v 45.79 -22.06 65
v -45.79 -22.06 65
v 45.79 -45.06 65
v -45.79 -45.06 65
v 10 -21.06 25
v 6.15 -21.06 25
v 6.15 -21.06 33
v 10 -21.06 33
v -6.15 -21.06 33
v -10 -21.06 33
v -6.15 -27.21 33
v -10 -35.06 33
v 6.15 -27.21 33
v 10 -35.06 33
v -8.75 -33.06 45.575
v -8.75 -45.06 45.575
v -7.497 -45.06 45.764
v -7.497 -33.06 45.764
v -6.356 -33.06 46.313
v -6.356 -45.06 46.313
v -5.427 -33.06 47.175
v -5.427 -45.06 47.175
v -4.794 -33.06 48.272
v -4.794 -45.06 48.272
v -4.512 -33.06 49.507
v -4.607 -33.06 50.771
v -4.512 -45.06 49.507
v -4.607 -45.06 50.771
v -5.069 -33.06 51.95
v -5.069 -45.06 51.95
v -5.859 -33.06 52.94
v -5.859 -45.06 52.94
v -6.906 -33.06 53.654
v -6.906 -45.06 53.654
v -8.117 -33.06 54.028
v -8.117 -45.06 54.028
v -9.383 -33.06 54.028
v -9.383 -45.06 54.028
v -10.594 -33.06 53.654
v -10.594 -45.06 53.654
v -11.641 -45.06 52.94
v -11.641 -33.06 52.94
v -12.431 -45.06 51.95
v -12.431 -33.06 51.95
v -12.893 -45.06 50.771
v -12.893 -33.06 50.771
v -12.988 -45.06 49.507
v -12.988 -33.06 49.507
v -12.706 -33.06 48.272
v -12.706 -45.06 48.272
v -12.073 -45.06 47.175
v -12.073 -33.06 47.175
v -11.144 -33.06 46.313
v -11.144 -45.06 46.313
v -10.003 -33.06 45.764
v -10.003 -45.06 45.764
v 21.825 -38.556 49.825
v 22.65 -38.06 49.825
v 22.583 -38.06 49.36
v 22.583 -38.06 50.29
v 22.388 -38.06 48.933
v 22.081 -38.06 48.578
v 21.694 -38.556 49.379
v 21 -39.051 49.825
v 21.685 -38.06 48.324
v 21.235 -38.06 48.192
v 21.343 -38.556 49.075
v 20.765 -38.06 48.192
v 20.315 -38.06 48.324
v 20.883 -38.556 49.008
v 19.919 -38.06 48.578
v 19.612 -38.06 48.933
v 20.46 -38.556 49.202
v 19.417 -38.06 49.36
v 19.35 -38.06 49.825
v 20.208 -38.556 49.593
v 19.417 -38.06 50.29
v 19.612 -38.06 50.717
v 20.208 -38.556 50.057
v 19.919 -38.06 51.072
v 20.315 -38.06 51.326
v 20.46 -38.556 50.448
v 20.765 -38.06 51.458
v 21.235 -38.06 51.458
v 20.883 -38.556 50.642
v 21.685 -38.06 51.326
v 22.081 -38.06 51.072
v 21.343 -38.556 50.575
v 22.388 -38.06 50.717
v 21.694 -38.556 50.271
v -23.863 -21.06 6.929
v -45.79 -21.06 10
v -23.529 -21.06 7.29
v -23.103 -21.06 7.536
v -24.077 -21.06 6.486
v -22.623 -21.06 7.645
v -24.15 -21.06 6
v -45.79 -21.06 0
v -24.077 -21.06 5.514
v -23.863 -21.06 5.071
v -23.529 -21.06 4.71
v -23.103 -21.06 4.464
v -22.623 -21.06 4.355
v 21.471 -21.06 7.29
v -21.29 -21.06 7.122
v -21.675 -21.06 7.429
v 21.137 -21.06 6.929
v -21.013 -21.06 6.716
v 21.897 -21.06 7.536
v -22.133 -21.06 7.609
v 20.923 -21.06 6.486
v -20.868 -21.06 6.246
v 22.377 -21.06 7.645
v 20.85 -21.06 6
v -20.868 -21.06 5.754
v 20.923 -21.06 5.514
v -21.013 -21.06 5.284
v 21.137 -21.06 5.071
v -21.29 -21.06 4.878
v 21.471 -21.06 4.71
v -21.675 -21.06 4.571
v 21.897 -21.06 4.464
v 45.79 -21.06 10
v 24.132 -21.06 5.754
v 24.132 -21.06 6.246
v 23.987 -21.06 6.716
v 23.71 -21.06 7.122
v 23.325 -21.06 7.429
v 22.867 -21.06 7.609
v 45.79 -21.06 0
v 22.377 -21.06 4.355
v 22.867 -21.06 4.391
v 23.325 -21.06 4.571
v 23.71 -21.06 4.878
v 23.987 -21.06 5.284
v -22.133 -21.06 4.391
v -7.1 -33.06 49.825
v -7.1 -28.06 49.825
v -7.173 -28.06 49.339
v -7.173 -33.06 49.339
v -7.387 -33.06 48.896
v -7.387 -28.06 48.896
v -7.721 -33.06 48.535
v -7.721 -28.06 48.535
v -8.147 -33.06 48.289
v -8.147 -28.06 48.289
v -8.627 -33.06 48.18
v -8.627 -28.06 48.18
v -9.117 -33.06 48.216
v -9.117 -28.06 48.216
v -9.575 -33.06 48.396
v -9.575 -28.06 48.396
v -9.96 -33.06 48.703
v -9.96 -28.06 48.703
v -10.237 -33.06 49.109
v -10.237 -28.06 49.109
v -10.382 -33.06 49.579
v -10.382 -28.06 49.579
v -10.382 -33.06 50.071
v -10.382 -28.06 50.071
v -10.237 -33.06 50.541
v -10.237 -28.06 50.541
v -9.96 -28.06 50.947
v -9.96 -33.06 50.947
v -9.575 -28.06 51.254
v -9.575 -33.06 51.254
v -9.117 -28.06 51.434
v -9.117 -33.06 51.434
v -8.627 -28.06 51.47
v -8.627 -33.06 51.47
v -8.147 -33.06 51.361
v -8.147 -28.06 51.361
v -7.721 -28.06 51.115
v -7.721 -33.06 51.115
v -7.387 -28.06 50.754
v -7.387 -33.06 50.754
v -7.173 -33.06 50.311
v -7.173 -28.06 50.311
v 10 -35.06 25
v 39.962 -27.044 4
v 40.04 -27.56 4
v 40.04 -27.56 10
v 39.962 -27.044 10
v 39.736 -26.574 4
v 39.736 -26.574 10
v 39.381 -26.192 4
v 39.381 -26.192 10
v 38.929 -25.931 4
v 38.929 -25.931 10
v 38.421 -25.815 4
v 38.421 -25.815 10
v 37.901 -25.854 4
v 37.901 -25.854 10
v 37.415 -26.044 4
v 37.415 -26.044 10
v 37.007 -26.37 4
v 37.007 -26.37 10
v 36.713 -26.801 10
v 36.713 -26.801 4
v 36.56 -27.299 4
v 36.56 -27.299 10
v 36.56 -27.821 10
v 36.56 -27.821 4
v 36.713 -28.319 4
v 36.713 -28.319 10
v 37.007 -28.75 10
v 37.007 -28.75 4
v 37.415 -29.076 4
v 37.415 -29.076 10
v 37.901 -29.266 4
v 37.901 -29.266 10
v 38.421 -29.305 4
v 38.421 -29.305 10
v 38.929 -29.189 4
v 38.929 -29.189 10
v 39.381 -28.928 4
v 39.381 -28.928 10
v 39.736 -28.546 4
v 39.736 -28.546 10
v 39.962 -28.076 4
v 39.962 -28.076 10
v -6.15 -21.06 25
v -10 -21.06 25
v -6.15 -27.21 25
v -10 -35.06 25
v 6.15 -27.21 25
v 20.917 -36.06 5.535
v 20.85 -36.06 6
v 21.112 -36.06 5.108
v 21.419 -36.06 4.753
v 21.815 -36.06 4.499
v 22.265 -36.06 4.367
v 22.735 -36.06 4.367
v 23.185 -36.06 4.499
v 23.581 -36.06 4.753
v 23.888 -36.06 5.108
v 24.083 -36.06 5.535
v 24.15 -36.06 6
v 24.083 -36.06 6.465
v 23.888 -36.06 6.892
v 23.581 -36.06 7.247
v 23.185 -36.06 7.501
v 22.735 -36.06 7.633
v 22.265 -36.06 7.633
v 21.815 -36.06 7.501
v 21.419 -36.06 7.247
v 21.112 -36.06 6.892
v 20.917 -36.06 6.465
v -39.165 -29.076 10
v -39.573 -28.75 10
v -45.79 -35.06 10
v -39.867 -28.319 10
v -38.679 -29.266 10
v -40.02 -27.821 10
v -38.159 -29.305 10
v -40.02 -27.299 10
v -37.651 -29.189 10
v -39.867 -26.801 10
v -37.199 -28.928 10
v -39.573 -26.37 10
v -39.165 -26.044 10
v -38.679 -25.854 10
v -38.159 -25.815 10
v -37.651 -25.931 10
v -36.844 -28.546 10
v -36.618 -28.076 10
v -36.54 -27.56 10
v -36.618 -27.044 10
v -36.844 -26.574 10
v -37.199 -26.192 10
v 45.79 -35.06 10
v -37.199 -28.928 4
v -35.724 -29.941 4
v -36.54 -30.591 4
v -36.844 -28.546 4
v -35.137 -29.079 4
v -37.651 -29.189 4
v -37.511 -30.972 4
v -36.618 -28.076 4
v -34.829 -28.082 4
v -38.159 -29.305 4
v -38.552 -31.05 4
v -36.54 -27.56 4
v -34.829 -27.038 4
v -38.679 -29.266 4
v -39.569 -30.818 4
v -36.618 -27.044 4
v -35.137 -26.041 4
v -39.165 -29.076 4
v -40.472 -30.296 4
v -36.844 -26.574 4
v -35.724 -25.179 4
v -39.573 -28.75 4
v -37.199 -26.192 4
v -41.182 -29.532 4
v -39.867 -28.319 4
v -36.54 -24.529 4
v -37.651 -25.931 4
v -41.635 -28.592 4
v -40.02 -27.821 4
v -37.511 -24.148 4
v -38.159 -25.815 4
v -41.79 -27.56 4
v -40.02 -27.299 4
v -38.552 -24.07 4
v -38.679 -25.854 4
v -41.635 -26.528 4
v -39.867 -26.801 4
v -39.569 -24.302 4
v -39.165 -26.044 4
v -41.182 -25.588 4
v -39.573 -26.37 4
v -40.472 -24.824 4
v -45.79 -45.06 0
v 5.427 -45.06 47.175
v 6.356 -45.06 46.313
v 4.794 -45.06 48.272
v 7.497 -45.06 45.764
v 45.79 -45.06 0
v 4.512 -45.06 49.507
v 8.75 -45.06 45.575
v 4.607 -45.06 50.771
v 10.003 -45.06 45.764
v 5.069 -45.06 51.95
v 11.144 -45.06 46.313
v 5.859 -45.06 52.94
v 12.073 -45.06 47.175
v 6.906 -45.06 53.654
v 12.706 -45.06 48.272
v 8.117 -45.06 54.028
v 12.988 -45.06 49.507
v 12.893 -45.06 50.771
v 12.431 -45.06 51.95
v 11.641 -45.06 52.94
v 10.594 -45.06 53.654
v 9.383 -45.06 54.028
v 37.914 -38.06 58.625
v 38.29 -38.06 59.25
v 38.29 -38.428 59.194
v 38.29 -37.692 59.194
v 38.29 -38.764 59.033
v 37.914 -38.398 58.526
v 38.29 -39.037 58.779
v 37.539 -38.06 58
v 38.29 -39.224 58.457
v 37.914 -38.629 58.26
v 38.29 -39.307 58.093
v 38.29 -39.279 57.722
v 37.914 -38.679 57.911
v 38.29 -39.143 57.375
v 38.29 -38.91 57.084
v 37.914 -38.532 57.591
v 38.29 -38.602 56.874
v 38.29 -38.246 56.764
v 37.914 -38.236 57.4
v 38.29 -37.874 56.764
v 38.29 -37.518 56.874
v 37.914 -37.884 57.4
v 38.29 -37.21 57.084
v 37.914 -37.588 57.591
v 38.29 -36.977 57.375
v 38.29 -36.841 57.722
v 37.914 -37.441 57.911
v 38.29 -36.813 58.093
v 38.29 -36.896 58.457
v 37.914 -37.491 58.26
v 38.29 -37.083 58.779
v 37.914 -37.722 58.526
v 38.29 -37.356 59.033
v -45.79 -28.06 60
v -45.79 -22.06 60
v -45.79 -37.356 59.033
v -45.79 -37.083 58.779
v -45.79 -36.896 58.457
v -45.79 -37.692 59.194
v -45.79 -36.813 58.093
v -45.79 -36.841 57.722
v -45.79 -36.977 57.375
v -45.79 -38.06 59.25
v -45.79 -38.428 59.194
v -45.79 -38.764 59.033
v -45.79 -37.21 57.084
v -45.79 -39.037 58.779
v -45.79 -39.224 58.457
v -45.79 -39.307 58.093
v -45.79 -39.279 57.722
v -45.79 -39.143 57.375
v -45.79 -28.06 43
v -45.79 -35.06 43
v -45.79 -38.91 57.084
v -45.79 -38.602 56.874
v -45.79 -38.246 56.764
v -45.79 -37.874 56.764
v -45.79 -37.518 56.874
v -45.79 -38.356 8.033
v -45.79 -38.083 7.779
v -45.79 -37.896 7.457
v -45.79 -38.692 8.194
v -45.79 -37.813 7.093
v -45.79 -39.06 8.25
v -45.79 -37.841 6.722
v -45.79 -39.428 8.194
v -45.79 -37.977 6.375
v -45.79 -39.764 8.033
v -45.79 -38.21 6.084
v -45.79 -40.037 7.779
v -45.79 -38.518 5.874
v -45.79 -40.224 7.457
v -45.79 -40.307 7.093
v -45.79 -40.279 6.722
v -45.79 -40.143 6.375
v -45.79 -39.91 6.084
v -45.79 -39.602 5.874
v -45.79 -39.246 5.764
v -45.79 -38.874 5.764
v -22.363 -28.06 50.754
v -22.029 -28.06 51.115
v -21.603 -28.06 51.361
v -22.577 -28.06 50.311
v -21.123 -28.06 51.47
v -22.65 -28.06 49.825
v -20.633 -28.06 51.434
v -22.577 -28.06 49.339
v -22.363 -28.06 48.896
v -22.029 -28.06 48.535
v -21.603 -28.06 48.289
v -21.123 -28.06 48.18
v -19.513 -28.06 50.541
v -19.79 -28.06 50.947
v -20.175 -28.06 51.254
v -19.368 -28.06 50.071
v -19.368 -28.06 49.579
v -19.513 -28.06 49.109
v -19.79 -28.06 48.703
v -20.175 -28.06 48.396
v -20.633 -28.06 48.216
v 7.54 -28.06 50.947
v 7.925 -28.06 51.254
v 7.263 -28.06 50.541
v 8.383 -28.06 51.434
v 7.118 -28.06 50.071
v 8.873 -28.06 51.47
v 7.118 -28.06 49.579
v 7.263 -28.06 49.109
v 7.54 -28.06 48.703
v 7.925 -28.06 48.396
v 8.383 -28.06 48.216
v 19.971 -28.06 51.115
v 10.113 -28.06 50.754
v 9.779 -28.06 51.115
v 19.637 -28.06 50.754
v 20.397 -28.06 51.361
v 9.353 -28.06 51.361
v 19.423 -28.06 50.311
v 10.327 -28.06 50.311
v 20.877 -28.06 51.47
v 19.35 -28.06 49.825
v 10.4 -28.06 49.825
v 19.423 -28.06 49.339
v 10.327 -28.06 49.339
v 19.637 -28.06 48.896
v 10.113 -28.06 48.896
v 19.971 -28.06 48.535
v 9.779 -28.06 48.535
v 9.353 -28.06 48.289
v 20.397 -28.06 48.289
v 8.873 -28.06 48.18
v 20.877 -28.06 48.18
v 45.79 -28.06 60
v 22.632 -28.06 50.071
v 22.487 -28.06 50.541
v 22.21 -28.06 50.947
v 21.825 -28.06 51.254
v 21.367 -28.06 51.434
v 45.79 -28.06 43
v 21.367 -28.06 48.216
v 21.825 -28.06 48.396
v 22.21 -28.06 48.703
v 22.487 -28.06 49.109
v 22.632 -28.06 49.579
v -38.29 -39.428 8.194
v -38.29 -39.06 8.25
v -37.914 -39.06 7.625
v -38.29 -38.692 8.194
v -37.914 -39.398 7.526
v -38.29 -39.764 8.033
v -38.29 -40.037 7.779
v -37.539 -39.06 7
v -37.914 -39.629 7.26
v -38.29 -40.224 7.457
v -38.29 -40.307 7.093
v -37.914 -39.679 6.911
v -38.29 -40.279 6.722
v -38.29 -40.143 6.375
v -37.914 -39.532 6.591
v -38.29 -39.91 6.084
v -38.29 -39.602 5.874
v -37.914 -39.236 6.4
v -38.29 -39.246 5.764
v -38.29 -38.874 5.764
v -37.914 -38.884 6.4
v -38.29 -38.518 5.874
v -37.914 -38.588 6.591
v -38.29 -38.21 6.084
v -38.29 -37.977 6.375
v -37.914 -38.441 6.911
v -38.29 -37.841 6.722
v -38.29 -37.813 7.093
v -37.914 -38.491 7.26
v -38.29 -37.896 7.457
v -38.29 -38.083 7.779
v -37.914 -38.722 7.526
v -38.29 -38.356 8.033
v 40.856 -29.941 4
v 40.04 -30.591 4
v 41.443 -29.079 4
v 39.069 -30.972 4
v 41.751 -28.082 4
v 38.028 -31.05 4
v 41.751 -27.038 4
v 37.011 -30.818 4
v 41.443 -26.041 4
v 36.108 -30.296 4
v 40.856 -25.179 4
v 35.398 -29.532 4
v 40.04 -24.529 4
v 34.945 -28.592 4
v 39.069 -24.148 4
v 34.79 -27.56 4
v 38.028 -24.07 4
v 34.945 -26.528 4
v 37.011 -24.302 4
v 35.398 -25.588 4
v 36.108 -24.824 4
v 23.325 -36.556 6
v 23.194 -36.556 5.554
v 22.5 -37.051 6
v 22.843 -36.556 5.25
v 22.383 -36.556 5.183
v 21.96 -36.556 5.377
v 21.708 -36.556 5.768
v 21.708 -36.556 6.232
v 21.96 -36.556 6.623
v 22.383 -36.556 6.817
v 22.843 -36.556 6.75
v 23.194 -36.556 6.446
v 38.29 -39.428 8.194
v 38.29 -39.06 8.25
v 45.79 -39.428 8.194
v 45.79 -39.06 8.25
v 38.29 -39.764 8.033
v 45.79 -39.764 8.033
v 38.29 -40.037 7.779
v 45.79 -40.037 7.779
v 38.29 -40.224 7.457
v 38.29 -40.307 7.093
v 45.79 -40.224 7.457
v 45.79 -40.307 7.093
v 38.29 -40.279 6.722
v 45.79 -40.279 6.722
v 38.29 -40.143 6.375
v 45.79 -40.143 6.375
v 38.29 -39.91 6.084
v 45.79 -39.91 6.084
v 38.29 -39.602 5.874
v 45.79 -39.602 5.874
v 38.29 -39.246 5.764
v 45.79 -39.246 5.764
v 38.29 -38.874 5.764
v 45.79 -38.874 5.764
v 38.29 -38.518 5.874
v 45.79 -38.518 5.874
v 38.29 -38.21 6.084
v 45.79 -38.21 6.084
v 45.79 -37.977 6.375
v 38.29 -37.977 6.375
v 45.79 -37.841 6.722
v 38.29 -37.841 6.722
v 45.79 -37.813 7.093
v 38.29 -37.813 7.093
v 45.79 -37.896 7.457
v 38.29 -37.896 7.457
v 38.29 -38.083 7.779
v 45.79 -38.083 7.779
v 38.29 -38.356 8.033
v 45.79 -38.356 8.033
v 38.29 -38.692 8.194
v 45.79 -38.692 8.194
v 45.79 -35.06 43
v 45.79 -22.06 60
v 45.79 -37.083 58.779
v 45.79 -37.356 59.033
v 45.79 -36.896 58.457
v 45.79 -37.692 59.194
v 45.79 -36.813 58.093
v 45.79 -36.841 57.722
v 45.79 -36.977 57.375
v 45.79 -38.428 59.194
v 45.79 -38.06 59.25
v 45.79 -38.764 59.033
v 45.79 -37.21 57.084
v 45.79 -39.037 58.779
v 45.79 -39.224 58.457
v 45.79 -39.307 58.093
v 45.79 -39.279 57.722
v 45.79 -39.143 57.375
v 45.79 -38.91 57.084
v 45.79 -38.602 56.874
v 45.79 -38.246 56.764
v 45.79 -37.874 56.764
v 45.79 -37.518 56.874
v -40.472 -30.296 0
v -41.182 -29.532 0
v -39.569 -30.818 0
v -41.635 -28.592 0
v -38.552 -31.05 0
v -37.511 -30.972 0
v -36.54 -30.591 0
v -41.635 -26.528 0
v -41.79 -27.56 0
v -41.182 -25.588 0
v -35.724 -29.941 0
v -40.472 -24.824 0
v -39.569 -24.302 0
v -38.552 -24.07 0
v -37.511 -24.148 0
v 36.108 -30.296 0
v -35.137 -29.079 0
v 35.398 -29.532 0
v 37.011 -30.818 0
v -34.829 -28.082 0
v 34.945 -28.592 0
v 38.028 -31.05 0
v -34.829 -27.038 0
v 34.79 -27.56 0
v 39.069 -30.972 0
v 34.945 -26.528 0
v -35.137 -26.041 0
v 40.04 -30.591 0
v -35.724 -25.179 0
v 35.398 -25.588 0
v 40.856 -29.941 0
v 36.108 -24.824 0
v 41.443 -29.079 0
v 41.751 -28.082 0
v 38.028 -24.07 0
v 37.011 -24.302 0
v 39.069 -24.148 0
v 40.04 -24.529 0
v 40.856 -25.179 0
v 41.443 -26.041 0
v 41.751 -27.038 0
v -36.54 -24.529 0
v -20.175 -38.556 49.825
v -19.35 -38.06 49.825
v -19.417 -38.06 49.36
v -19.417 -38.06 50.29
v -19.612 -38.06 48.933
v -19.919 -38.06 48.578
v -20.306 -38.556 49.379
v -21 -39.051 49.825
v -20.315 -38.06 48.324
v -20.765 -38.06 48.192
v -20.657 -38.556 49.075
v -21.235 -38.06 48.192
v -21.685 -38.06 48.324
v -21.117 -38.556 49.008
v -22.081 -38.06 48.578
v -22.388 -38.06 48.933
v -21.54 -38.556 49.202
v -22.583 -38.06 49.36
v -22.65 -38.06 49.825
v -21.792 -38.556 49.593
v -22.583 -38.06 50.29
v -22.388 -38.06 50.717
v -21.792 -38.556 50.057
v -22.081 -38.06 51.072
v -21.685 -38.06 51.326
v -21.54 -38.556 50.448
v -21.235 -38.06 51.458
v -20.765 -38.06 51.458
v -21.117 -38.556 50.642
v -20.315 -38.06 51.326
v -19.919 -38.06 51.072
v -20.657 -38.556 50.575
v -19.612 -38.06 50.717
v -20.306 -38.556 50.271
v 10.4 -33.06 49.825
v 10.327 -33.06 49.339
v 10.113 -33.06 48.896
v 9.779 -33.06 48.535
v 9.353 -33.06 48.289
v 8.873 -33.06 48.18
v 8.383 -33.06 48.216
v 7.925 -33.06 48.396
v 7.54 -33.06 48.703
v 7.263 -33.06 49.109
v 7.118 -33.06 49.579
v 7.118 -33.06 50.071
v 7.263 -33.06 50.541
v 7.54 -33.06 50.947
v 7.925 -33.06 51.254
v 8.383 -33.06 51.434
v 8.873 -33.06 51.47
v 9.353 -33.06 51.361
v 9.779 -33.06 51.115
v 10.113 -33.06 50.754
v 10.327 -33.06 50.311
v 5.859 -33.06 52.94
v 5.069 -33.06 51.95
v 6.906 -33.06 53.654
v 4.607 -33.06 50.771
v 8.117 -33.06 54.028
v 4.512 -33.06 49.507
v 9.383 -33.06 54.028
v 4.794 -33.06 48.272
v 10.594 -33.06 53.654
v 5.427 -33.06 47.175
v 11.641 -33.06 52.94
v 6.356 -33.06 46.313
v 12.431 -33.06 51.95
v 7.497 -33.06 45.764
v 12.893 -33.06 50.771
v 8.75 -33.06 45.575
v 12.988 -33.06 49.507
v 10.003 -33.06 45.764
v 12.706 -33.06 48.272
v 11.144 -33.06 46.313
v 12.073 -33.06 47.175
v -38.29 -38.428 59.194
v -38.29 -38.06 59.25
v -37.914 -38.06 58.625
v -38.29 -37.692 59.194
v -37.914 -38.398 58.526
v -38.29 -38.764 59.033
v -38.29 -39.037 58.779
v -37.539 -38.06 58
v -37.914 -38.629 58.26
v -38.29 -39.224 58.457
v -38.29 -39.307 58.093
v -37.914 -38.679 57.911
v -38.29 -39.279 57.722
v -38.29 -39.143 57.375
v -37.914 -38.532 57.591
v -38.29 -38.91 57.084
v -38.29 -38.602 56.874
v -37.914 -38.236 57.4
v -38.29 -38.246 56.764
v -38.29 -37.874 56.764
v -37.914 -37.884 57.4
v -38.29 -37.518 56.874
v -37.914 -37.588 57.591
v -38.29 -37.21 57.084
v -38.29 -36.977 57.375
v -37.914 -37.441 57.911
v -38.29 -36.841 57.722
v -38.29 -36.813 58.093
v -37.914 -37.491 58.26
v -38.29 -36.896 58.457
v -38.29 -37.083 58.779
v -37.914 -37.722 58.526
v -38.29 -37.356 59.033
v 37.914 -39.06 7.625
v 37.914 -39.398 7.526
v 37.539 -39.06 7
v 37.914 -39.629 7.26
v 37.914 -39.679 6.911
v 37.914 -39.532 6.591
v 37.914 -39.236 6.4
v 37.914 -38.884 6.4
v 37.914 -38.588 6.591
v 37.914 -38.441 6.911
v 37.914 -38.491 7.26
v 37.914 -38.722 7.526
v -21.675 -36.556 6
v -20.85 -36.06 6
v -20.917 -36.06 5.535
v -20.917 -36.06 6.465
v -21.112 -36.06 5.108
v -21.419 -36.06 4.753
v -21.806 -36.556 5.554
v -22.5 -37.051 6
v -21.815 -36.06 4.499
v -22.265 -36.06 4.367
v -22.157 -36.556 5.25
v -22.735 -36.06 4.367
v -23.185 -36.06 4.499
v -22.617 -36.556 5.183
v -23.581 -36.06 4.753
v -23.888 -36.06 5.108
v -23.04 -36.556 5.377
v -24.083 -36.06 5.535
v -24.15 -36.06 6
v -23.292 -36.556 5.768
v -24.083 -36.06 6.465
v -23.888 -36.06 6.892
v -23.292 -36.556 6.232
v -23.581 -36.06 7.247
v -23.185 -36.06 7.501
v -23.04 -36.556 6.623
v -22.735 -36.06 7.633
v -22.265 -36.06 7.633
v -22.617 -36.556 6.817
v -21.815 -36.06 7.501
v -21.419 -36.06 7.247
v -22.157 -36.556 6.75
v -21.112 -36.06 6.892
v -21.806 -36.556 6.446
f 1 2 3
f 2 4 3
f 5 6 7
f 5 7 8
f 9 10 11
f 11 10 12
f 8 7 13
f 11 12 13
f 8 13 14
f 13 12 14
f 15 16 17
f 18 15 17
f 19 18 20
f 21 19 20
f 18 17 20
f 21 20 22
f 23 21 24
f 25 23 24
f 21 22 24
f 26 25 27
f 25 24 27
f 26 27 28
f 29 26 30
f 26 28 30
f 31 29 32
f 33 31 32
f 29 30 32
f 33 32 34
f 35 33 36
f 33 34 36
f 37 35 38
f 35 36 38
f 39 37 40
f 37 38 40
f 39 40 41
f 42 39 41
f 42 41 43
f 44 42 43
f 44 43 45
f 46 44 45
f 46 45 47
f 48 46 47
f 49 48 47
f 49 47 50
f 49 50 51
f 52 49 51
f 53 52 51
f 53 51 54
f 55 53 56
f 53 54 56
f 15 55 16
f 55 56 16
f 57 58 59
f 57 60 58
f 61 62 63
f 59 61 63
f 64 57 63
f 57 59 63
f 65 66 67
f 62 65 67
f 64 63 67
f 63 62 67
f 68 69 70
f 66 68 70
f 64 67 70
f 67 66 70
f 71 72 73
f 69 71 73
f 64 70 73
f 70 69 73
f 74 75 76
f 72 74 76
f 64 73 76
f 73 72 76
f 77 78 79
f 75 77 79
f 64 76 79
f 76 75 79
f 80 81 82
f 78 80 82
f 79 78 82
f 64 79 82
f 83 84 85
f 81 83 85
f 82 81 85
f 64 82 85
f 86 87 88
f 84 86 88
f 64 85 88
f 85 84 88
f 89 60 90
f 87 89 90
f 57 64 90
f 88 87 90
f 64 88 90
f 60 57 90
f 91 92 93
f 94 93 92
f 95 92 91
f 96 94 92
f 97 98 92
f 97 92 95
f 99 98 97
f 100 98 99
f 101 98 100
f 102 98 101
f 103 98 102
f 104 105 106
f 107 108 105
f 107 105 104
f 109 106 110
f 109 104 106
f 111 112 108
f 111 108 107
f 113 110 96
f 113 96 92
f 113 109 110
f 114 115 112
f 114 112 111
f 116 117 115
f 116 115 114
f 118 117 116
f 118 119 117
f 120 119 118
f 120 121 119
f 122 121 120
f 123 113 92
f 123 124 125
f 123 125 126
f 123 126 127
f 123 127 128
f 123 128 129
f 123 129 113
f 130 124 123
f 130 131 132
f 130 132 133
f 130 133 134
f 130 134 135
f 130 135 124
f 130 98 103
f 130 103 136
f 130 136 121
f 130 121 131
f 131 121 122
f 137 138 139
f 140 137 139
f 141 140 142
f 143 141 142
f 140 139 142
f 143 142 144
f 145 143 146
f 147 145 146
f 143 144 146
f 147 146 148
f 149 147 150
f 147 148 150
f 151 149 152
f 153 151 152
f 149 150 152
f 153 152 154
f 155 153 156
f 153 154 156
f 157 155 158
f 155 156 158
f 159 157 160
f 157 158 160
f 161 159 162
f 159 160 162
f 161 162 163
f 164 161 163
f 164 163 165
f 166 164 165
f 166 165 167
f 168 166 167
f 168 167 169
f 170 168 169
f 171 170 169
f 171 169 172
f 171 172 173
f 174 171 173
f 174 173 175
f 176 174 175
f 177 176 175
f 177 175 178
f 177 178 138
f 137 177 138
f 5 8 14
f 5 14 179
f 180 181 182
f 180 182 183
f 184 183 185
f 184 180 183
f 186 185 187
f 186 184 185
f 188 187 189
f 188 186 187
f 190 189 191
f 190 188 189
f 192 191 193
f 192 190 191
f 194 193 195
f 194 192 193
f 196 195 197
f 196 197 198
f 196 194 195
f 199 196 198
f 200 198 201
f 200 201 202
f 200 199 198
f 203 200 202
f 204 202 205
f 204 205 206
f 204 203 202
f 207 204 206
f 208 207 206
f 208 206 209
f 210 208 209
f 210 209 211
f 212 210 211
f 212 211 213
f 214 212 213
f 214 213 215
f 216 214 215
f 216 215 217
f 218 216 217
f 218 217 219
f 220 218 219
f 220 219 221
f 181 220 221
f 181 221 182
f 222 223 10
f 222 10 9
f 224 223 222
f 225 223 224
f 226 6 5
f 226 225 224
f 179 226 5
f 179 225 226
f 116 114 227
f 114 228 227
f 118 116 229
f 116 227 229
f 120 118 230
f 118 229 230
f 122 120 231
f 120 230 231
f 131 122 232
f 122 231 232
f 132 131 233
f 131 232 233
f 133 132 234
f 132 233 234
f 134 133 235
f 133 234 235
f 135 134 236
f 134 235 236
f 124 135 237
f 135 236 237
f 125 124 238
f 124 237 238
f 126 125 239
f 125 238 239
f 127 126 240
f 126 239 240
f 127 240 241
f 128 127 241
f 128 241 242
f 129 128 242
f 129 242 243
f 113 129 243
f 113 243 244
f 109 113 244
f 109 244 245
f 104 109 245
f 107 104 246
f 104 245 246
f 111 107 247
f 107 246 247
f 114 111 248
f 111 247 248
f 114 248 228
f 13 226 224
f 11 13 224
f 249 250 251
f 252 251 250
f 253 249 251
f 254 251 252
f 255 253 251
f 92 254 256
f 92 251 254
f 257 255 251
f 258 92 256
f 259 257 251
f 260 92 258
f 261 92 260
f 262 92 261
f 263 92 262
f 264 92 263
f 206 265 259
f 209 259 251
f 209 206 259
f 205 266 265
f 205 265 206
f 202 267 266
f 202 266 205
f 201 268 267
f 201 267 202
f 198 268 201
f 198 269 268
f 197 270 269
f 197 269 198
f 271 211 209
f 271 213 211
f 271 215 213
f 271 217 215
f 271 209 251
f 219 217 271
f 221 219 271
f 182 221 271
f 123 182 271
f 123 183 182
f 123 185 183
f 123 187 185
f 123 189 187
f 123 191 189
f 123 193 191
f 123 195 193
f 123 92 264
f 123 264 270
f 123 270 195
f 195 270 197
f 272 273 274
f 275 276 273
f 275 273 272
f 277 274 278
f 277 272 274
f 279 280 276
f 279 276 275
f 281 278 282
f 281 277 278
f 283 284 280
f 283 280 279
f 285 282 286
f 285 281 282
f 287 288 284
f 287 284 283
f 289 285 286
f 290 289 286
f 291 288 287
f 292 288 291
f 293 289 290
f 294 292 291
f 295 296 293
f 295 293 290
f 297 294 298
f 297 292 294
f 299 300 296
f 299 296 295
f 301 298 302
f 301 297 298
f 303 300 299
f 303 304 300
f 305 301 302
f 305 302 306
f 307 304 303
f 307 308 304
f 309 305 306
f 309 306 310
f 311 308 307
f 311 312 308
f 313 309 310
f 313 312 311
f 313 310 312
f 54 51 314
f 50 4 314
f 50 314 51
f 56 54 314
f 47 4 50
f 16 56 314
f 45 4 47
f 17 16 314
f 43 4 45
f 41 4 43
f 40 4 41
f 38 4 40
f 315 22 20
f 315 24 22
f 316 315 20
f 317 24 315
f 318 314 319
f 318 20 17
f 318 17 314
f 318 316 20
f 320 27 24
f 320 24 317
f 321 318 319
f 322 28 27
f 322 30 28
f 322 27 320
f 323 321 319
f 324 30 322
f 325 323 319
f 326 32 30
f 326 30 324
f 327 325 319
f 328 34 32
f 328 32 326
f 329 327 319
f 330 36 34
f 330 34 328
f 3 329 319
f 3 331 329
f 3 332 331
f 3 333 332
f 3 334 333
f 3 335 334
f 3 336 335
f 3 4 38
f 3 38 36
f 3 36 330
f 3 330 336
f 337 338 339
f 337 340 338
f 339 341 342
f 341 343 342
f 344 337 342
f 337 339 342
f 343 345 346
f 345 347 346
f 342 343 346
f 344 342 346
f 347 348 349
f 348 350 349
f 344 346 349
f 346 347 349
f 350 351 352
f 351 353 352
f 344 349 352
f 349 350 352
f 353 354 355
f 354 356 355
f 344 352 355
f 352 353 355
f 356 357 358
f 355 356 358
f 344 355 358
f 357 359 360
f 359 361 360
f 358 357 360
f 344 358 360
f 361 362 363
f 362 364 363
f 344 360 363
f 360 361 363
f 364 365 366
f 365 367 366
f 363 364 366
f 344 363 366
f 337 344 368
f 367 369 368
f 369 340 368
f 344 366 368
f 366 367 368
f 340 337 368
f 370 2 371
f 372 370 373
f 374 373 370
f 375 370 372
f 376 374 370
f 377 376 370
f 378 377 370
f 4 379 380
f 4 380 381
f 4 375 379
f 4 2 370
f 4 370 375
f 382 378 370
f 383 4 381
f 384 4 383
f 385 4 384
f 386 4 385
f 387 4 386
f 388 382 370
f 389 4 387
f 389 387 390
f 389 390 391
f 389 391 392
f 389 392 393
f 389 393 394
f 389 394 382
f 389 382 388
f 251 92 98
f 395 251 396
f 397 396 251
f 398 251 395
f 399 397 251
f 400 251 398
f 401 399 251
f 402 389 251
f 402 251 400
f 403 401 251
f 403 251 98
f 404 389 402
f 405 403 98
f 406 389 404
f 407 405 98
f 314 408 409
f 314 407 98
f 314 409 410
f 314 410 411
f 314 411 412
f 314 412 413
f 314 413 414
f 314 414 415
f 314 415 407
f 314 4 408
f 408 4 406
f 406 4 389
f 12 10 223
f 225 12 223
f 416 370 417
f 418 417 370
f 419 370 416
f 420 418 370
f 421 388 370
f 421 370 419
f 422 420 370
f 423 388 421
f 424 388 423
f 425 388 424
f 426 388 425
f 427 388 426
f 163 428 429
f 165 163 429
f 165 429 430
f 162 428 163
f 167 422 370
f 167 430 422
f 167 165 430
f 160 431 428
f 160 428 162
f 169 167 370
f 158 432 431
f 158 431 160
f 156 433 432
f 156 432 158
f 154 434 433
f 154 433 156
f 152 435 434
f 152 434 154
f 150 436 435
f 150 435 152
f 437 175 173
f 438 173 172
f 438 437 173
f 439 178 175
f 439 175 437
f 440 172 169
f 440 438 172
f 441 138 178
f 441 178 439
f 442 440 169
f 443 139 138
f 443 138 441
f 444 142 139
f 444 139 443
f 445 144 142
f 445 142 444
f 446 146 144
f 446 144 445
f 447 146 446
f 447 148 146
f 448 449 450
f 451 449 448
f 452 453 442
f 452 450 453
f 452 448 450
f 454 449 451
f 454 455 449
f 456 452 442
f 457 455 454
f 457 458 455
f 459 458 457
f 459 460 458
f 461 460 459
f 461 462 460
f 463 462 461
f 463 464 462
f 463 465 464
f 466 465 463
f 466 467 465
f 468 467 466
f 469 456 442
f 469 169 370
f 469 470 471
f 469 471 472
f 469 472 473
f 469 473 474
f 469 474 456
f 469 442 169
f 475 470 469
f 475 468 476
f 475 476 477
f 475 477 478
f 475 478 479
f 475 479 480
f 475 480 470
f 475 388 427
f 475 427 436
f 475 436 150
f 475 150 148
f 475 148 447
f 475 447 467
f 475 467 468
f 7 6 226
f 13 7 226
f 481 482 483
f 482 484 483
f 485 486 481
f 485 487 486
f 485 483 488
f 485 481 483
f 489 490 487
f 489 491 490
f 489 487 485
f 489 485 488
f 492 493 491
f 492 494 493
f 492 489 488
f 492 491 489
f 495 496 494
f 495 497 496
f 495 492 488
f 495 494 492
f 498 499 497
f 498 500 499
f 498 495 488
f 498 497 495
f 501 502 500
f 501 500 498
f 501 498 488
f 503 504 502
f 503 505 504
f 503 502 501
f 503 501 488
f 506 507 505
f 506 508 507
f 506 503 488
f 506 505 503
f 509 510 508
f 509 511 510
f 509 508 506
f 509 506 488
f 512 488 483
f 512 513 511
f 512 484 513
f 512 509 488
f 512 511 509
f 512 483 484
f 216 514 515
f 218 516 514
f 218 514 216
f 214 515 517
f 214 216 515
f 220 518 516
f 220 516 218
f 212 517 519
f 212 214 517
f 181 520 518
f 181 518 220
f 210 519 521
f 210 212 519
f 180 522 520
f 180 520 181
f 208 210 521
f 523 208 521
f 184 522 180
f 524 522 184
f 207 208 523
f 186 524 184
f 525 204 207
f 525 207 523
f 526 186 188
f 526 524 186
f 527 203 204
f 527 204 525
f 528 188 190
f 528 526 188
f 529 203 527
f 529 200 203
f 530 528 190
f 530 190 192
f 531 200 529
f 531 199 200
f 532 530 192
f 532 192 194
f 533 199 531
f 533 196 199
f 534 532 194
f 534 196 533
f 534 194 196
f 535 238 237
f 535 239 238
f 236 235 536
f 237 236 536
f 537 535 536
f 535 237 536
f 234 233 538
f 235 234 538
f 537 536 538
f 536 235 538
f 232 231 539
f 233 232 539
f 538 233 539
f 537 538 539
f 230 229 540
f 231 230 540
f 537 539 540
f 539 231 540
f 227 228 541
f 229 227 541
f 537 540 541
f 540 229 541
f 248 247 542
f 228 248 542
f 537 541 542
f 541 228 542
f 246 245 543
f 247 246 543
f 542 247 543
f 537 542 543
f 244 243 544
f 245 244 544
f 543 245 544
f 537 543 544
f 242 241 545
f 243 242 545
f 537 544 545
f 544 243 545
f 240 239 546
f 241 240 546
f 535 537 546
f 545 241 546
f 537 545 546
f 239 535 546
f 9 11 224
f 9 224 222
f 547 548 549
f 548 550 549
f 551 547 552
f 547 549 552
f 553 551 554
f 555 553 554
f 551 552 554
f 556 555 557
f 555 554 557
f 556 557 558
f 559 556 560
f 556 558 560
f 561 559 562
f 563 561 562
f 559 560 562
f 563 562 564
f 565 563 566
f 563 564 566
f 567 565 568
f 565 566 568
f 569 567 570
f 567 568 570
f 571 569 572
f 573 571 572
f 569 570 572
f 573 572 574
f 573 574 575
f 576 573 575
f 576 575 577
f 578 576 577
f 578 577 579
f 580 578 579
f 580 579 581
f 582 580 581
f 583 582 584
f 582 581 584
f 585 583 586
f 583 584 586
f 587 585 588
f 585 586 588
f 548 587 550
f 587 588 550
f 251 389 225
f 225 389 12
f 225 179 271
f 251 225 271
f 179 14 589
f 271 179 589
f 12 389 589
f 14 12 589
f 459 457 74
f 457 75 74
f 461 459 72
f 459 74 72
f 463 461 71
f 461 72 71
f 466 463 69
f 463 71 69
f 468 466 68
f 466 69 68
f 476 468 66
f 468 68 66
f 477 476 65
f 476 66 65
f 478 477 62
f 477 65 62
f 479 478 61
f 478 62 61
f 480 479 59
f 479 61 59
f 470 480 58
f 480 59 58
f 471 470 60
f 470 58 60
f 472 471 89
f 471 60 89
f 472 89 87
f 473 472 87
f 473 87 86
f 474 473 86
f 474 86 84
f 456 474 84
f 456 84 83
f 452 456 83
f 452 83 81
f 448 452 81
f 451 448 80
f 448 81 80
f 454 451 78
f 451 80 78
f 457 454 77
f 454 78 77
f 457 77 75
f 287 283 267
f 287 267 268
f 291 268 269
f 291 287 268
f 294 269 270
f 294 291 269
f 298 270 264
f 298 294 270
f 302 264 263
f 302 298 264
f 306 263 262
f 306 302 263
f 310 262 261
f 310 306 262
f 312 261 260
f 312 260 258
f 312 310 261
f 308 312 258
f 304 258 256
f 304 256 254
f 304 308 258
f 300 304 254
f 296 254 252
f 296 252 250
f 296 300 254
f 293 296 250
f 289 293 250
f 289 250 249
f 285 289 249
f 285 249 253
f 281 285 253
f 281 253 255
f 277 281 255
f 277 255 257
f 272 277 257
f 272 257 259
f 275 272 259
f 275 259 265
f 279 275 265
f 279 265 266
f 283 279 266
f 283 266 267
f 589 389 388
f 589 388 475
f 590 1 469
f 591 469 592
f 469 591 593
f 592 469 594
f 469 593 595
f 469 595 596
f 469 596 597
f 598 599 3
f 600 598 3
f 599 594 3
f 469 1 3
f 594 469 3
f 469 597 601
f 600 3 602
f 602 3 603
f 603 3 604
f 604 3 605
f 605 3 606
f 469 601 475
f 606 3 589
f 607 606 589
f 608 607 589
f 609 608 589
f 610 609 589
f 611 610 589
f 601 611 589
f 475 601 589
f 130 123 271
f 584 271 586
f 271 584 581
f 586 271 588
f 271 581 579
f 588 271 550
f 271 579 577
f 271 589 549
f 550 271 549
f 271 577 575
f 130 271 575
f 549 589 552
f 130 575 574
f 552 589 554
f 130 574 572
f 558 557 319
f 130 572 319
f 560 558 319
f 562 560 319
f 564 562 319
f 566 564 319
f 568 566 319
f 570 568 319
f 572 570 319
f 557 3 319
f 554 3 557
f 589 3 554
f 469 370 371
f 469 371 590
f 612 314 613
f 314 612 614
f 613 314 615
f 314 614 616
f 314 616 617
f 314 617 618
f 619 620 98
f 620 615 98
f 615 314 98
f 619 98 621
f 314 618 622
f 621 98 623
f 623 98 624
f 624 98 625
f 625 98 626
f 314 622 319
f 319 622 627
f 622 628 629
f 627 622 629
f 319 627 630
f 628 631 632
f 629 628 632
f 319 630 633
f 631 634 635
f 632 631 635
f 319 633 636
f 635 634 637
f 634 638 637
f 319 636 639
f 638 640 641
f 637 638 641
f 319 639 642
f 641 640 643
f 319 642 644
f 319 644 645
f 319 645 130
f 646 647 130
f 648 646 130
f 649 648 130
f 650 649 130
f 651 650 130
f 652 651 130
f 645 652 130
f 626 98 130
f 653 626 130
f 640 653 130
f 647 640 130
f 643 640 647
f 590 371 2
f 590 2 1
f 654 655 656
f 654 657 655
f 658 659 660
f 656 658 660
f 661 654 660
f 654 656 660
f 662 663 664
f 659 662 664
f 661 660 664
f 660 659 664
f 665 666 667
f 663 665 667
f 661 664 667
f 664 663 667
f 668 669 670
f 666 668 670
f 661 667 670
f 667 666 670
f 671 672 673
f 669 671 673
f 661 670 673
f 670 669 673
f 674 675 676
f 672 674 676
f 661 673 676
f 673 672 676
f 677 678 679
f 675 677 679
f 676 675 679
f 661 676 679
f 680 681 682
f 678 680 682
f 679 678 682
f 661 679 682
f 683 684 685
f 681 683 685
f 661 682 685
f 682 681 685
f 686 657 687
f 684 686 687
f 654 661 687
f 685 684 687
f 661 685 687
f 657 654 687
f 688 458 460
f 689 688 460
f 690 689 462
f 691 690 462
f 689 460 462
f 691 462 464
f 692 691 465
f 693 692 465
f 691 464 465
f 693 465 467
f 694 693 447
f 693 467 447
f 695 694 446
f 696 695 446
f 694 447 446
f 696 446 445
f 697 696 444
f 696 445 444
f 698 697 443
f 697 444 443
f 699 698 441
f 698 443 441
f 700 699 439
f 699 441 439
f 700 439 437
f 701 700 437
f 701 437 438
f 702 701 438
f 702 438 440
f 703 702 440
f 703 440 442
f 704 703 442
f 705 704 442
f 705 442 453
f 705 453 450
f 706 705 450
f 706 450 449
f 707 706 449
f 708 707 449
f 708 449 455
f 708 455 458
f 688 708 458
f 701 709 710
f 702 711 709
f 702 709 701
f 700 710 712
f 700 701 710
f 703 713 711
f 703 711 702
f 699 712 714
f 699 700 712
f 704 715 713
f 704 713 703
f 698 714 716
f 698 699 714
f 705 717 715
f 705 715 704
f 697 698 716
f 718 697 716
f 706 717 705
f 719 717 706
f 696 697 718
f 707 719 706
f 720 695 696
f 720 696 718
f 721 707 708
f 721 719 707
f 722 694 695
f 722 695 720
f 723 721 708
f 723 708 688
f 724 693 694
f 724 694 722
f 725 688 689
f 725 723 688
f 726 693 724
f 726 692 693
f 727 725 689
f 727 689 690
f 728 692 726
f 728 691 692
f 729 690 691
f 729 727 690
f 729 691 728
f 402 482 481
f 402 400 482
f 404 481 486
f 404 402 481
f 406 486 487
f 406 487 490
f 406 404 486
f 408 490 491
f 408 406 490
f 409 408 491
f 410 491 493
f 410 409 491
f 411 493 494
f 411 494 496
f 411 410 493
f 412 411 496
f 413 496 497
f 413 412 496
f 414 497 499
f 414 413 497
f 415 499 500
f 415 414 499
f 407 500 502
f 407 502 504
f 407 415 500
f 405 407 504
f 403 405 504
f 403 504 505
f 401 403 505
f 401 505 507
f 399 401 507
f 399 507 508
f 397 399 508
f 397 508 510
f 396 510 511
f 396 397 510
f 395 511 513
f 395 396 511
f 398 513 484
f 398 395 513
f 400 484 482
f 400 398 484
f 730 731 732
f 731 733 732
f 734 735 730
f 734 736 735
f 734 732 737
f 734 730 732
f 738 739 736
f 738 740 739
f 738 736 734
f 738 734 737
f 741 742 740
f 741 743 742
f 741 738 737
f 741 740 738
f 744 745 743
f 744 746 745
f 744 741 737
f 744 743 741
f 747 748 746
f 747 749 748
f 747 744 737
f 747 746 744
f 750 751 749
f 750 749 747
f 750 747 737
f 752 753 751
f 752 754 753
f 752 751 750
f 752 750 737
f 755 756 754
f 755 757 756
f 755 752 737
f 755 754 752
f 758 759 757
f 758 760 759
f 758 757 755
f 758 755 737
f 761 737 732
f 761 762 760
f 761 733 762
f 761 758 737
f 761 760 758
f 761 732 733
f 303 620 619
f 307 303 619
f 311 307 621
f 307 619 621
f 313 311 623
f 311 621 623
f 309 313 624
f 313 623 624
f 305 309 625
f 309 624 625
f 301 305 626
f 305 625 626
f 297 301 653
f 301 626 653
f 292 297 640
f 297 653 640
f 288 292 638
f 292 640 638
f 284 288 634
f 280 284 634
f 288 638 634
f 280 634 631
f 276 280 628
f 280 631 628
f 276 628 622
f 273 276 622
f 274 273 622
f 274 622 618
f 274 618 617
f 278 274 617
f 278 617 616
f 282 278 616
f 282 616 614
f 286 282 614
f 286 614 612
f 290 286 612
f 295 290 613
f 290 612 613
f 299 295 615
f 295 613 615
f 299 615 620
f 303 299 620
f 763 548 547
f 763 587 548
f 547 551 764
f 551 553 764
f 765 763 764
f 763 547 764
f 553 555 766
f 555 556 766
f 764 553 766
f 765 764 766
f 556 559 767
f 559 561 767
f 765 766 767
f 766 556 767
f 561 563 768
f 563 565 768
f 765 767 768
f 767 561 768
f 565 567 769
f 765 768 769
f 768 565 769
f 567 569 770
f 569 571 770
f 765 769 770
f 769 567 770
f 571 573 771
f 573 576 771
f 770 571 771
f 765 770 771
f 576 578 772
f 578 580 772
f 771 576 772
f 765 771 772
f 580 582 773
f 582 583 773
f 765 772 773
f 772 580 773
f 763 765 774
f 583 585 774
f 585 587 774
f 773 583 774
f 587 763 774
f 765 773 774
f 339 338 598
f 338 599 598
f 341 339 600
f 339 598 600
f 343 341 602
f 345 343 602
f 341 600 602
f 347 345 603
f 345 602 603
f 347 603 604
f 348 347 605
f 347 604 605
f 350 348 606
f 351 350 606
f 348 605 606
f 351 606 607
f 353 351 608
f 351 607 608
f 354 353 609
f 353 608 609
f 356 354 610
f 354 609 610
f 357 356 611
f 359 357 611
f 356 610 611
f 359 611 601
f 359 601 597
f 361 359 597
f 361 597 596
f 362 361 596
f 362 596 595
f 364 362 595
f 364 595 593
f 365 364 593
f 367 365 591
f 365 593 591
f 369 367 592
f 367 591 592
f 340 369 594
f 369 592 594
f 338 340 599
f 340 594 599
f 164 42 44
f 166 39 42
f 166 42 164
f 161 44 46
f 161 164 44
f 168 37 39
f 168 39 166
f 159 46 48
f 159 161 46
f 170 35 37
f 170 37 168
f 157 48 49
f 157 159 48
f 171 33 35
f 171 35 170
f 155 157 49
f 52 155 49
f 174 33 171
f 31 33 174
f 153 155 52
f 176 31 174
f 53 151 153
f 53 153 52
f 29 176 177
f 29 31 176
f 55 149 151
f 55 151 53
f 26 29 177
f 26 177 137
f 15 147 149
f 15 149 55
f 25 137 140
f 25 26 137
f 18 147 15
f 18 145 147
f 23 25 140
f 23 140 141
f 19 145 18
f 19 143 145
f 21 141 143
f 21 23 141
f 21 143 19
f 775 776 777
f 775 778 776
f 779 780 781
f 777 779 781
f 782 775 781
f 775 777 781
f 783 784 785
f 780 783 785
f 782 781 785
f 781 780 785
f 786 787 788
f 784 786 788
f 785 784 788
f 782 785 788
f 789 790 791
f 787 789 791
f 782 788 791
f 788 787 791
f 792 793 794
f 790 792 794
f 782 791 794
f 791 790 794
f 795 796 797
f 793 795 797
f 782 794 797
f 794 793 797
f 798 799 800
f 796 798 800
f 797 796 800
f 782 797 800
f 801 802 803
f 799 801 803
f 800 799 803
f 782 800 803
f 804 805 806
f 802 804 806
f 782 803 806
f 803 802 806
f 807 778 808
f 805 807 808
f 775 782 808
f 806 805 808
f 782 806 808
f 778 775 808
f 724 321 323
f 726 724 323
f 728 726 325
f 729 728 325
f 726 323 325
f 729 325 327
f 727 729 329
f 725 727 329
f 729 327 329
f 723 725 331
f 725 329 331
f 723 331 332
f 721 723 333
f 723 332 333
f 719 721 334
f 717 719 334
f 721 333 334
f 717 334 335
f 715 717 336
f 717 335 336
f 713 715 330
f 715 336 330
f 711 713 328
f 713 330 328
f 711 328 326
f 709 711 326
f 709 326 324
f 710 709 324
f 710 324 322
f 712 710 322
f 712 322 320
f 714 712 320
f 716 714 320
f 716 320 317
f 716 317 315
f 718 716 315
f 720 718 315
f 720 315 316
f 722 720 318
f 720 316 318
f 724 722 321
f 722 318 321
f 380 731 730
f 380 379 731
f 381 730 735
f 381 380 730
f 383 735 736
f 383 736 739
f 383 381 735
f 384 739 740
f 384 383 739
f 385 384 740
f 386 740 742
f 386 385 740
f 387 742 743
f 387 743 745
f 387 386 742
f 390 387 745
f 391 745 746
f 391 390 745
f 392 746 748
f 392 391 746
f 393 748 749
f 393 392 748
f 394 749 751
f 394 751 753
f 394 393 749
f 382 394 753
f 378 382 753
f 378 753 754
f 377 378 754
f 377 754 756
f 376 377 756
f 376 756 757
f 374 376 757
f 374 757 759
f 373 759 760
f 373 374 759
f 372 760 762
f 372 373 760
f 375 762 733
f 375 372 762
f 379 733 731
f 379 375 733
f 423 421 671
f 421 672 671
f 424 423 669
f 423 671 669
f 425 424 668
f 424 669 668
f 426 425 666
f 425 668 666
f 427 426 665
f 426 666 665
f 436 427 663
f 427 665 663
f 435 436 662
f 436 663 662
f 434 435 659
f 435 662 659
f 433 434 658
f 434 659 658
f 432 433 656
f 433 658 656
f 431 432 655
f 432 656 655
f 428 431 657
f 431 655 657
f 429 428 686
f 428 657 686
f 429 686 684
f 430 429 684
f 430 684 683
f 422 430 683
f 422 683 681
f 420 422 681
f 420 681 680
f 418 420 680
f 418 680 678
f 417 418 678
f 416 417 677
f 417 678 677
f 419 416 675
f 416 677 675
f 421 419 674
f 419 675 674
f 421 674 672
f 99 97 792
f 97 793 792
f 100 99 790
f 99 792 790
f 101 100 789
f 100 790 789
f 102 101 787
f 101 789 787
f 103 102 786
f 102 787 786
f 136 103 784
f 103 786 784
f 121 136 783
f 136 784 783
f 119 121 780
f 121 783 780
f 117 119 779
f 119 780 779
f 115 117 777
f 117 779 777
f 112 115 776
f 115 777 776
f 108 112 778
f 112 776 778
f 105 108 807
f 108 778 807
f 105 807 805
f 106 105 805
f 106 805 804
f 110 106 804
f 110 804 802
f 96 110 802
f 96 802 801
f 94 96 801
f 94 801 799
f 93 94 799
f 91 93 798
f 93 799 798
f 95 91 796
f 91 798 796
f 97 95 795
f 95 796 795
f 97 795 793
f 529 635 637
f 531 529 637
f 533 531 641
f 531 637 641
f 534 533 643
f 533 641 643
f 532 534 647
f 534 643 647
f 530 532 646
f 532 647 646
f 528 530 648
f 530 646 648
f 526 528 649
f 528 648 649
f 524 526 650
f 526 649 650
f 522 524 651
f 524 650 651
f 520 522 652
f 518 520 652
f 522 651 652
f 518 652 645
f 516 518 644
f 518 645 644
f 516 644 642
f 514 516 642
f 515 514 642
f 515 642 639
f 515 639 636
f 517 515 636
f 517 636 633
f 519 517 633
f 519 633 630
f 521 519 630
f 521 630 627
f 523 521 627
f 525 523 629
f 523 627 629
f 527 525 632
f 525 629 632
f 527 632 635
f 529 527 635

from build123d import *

# Parameters (mm, degrees)
SKETCH1_W                  = 91.58
SKETCH1_H                  = 70.12
SKETCH1_R                  = 1.75
BOSS_EXTRUDE1_DEPTH        = 10
SKETCH2_W                  = 91.58
SKETCH2_H                  = 65
BOSS_EXTRUDE2_DEPTH        = 10
SKETCH3_W                  = 20
SKETCH3_H                  = 8
BOSS_EXTRUDE3_DEPTH        = 14
CUT_EXTRUDE1_DEPTH         = 75
SKETCH6_W                  = 91.58
SKETCH6_H                  = 65
CUT_EXTRUDE3_DEPTH         = 98.319979963
SKETCH11_W                 = 91.58
SKETCH11_H                 = 22
BOSS_EXTRUDE4_DEPTH        = 7
SKETCH12_W                 = 91.58
SKETCH12_H                 = 5
BOSS_EXTRUDE5_DEPTH        = 6
M4_TAPPED_HOLE2_D          = 3.3
M4_TAPPED_HOLE2_DEPTH      = 10
M4_TAPPED_HOLE2_TIP        = 0.991420021
SKETCH16_R                 = 4.25
CUT_EXTRUDE4_DEPTH         = 12
M4_TAPPED_HOLE3_D          = 3.3
SKETCH21_R                 = 3.5
CUT_EXTRUDE5_DEPTH         = 4
M4_TAPPED_HOLE4_D          = 3.3
M4_TAPPED_HOLE4_DEPTH      = 15
M4_TAPPED_HOLE4_TIP        = 0.991420021
M3_TAPPED_HOLE1_AT_2_COUNT = 2
M3_TAPPED_HOLE1_AT_2_PITCH = 51.009802979


with BuildPart() as part:
    # Sketch1 → Boss-Extrude1 (new body)
    with BuildSketch(Plane.XY):
        Rectangle(SKETCH1_W, SKETCH1_H)
        with Locations((-16.825414035, 27.05)):
            Circle(SKETCH1_R, mode=Mode.SUBTRACT)
        with Locations((33.464, 27.56)):
            Circle(SKETCH1_R, mode=Mode.SUBTRACT)
        with Locations((38.29, -27.56)):
            Circle(SKETCH1_R, mode=Mode.SUBTRACT)
        with Locations((-38.29, -27.56)):
            Circle(SKETCH1_R, mode=Mode.SUBTRACT)
    extrude(amount=BOSS_EXTRUDE1_DEPTH)

    # Sketch2 → Boss-Extrude2 (add)
    with BuildSketch(Plane.XZ.offset(35.06)):
        with Locations((0, 32.5)):
            Rectangle(SKETCH2_W, SKETCH2_H)
    extrude(amount=BOSS_EXTRUDE2_DEPTH)

    # Sketch3 → Boss-Extrude3 (add)
    with BuildSketch(Plane(origin=(0, -35.06, 0), x_dir=(1, 0, 0), z_dir=(0, 1, 0))):
        with Locations((0, -29)):
            Rectangle(SKETCH3_W, SKETCH3_H)
    extrude(amount=BOSS_EXTRUDE3_DEPTH)

    # Sketch4 → Cut-Extrude1 (cut)
    with BuildSketch(Plane(origin=(0, 0, 25), x_dir=(-1, 0, 0), z_dir=(0, 0, -1))):
        Polygon((6.15, -21.06), (6.15, -14.91), (-6.15, -14.91), (-6.15, -21.06), (-6.15, -27.21), (6.15, -27.21), align=None)
    extrude(amount=-CUT_EXTRUDE1_DEPTH, mode=Mode.SUBTRACT)

    # Sketch6 → Cut-Extrude3 (cut, through all)
    with BuildSketch(Plane(origin=(0, -21.06, 0), x_dir=(1, 0, 0), z_dir=(0, 1, 0))):
        with Locations((0, -32.5)):
            Rectangle(SKETCH6_W, SKETCH6_H)
    extrude(amount=CUT_EXTRUDE3_DEPTH, mode=Mode.SUBTRACT)

    # Sketch11 → Boss-Extrude4 (add)
    with BuildSketch(Plane(origin=(0, -35.06, 0), x_dir=(1, 0, 0), z_dir=(0, 1, 0))):
        with Locations((0, -54)):
            Rectangle(SKETCH11_W, SKETCH11_H)
    extrude(amount=BOSS_EXTRUDE4_DEPTH)

    # Sketch12 → Boss-Extrude5 (add)
    with BuildSketch(Plane(origin=(0, -28.06, 0), x_dir=(1, 0, 0), z_dir=(0, 1, 0))):
        with Locations((0, -62.5)):
            Rectangle(SKETCH12_W, SKETCH12_H)
    extrude(amount=BOSS_EXTRUDE5_DEPTH)

    # M4 Tapped Hole2
    with Locations(Plane(origin=(0, -28.06, 0), x_dir=(1, 0, 0), z_dir=(0, 1, 0))):
        with Locations((21, -49.825), (-21, -49.825)):
            Hole(M4_TAPPED_HOLE2_D / 2, depth=M4_TAPPED_HOLE2_DEPTH)
            with Locations((0, 0, -(M4_TAPPED_HOLE2_DEPTH + M4_TAPPED_HOLE2_TIP / 2))):  # 118° drill point
                Cone(0, M4_TAPPED_HOLE2_D / 2, M4_TAPPED_HOLE2_TIP, mode=Mode.SUBTRACT)

    # Sketch16 → Cut-Extrude4 (cut)
    with BuildSketch(Plane.XZ.offset(45.06)):
        with Locations(Location((-8.75, 49.825, 0), (0, 0, 270))):
            Circle(SKETCH16_R)
        with Locations(Location((8.75, 49.825, 0), (0, 0, 270))):
            Circle(SKETCH16_R)
    extrude(amount=-CUT_EXTRUDE4_DEPTH, mode=Mode.SUBTRACT)

    # M4 Tapped Hole3 (through all)
    with Locations(Plane(origin=(0, -33.06, 0), x_dir=(-1, 0, 0), z_dir=(0, -1, 0))):
        with Locations((8.75, -49.825), (-8.75, -49.825)):
            Hole(M4_TAPPED_HOLE3_D / 2)

    # Sketch21 → Cut-Extrude5 (cut)
    with BuildSketch(Plane(origin=(0, 0, 0), x_dir=(-1, 0, 0), z_dir=(0, 0, -1))):
        with Locations((-38.29, -27.56)):
            Circle(SKETCH21_R)
        with Locations((38.29, -27.56)):
            Circle(SKETCH21_R)
    extrude(amount=-CUT_EXTRUDE5_DEPTH, mode=Mode.SUBTRACT)

    # M4 Tapped Hole4
    with Locations(Plane(origin=(0, -21.06, 0), x_dir=(1, 0, 0), z_dir=(0, 1, 0))):
        with Locations((-22.5, -6), (22.5, -6)):
            Hole(M4_TAPPED_HOLE4_D / 2, depth=M4_TAPPED_HOLE4_DEPTH)
            with Locations((0, 0, -(M4_TAPPED_HOLE4_DEPTH + M4_TAPPED_HOLE4_TIP / 2))):  # 118° drill point
                Cone(0, M4_TAPPED_HOLE4_D / 2, M4_TAPPED_HOLE4_TIP, mode=Mode.SUBTRACT)

    # Sketch27 → M3 Tapped Hole1 (revolve, cut)
    with BuildSketch(Plane(origin=(-45.79, -38.06, 58), x_dir=(0, 0, 1), z_dir=(0, 1, 0))):
        Polygon((0, 0), (0, 8.251075774), (1.25, 7.5), (1.25, 0), align=None)
    m3_tapped_hole1 = revolve(axis=Axis((-52.14, -38.06, 58), (1, 0, 0)), mode=Mode.SUBTRACT)

    # M3 Tapped Hole1 at 2: M3 Tapped Hole1 ×2
    with Locations(*[Vector(0, -0.0196040749344456, -0.9998078216567245) * (i * M3_TAPPED_HOLE1_AT_2_PITCH) for i in range(1, M3_TAPPED_HOLE1_AT_2_COUNT)]):
        add(m3_tapped_hole1, mode=Mode.SUBTRACT)

    # Mirror1: M3 Tapped Hole1 across plane
    add(m3_tapped_hole1.mirror(Plane(origin=(0, 0, 0), x_dir=(0, 0, 1), z_dir=(1, 0, 0))), mode=Mode.SUBTRACT)

    # Mirror1 copy 1 sketch → Mirror1 copy 1 (revolve, cut)
    with BuildSketch(Plane(origin=(45.79, -39.06, 7), x_dir=(0, 0, 1), z_dir=(0, 1, 0))):
        Polygon((0, 0), (0, -8.251075774), (1.25, -7.5), (1.25, 0), align=None)
    revolve(axis=Axis((52.14, -39.06, 7), (1, 0, 0)), mode=Mode.SUBTRACT)


solid = part.part
